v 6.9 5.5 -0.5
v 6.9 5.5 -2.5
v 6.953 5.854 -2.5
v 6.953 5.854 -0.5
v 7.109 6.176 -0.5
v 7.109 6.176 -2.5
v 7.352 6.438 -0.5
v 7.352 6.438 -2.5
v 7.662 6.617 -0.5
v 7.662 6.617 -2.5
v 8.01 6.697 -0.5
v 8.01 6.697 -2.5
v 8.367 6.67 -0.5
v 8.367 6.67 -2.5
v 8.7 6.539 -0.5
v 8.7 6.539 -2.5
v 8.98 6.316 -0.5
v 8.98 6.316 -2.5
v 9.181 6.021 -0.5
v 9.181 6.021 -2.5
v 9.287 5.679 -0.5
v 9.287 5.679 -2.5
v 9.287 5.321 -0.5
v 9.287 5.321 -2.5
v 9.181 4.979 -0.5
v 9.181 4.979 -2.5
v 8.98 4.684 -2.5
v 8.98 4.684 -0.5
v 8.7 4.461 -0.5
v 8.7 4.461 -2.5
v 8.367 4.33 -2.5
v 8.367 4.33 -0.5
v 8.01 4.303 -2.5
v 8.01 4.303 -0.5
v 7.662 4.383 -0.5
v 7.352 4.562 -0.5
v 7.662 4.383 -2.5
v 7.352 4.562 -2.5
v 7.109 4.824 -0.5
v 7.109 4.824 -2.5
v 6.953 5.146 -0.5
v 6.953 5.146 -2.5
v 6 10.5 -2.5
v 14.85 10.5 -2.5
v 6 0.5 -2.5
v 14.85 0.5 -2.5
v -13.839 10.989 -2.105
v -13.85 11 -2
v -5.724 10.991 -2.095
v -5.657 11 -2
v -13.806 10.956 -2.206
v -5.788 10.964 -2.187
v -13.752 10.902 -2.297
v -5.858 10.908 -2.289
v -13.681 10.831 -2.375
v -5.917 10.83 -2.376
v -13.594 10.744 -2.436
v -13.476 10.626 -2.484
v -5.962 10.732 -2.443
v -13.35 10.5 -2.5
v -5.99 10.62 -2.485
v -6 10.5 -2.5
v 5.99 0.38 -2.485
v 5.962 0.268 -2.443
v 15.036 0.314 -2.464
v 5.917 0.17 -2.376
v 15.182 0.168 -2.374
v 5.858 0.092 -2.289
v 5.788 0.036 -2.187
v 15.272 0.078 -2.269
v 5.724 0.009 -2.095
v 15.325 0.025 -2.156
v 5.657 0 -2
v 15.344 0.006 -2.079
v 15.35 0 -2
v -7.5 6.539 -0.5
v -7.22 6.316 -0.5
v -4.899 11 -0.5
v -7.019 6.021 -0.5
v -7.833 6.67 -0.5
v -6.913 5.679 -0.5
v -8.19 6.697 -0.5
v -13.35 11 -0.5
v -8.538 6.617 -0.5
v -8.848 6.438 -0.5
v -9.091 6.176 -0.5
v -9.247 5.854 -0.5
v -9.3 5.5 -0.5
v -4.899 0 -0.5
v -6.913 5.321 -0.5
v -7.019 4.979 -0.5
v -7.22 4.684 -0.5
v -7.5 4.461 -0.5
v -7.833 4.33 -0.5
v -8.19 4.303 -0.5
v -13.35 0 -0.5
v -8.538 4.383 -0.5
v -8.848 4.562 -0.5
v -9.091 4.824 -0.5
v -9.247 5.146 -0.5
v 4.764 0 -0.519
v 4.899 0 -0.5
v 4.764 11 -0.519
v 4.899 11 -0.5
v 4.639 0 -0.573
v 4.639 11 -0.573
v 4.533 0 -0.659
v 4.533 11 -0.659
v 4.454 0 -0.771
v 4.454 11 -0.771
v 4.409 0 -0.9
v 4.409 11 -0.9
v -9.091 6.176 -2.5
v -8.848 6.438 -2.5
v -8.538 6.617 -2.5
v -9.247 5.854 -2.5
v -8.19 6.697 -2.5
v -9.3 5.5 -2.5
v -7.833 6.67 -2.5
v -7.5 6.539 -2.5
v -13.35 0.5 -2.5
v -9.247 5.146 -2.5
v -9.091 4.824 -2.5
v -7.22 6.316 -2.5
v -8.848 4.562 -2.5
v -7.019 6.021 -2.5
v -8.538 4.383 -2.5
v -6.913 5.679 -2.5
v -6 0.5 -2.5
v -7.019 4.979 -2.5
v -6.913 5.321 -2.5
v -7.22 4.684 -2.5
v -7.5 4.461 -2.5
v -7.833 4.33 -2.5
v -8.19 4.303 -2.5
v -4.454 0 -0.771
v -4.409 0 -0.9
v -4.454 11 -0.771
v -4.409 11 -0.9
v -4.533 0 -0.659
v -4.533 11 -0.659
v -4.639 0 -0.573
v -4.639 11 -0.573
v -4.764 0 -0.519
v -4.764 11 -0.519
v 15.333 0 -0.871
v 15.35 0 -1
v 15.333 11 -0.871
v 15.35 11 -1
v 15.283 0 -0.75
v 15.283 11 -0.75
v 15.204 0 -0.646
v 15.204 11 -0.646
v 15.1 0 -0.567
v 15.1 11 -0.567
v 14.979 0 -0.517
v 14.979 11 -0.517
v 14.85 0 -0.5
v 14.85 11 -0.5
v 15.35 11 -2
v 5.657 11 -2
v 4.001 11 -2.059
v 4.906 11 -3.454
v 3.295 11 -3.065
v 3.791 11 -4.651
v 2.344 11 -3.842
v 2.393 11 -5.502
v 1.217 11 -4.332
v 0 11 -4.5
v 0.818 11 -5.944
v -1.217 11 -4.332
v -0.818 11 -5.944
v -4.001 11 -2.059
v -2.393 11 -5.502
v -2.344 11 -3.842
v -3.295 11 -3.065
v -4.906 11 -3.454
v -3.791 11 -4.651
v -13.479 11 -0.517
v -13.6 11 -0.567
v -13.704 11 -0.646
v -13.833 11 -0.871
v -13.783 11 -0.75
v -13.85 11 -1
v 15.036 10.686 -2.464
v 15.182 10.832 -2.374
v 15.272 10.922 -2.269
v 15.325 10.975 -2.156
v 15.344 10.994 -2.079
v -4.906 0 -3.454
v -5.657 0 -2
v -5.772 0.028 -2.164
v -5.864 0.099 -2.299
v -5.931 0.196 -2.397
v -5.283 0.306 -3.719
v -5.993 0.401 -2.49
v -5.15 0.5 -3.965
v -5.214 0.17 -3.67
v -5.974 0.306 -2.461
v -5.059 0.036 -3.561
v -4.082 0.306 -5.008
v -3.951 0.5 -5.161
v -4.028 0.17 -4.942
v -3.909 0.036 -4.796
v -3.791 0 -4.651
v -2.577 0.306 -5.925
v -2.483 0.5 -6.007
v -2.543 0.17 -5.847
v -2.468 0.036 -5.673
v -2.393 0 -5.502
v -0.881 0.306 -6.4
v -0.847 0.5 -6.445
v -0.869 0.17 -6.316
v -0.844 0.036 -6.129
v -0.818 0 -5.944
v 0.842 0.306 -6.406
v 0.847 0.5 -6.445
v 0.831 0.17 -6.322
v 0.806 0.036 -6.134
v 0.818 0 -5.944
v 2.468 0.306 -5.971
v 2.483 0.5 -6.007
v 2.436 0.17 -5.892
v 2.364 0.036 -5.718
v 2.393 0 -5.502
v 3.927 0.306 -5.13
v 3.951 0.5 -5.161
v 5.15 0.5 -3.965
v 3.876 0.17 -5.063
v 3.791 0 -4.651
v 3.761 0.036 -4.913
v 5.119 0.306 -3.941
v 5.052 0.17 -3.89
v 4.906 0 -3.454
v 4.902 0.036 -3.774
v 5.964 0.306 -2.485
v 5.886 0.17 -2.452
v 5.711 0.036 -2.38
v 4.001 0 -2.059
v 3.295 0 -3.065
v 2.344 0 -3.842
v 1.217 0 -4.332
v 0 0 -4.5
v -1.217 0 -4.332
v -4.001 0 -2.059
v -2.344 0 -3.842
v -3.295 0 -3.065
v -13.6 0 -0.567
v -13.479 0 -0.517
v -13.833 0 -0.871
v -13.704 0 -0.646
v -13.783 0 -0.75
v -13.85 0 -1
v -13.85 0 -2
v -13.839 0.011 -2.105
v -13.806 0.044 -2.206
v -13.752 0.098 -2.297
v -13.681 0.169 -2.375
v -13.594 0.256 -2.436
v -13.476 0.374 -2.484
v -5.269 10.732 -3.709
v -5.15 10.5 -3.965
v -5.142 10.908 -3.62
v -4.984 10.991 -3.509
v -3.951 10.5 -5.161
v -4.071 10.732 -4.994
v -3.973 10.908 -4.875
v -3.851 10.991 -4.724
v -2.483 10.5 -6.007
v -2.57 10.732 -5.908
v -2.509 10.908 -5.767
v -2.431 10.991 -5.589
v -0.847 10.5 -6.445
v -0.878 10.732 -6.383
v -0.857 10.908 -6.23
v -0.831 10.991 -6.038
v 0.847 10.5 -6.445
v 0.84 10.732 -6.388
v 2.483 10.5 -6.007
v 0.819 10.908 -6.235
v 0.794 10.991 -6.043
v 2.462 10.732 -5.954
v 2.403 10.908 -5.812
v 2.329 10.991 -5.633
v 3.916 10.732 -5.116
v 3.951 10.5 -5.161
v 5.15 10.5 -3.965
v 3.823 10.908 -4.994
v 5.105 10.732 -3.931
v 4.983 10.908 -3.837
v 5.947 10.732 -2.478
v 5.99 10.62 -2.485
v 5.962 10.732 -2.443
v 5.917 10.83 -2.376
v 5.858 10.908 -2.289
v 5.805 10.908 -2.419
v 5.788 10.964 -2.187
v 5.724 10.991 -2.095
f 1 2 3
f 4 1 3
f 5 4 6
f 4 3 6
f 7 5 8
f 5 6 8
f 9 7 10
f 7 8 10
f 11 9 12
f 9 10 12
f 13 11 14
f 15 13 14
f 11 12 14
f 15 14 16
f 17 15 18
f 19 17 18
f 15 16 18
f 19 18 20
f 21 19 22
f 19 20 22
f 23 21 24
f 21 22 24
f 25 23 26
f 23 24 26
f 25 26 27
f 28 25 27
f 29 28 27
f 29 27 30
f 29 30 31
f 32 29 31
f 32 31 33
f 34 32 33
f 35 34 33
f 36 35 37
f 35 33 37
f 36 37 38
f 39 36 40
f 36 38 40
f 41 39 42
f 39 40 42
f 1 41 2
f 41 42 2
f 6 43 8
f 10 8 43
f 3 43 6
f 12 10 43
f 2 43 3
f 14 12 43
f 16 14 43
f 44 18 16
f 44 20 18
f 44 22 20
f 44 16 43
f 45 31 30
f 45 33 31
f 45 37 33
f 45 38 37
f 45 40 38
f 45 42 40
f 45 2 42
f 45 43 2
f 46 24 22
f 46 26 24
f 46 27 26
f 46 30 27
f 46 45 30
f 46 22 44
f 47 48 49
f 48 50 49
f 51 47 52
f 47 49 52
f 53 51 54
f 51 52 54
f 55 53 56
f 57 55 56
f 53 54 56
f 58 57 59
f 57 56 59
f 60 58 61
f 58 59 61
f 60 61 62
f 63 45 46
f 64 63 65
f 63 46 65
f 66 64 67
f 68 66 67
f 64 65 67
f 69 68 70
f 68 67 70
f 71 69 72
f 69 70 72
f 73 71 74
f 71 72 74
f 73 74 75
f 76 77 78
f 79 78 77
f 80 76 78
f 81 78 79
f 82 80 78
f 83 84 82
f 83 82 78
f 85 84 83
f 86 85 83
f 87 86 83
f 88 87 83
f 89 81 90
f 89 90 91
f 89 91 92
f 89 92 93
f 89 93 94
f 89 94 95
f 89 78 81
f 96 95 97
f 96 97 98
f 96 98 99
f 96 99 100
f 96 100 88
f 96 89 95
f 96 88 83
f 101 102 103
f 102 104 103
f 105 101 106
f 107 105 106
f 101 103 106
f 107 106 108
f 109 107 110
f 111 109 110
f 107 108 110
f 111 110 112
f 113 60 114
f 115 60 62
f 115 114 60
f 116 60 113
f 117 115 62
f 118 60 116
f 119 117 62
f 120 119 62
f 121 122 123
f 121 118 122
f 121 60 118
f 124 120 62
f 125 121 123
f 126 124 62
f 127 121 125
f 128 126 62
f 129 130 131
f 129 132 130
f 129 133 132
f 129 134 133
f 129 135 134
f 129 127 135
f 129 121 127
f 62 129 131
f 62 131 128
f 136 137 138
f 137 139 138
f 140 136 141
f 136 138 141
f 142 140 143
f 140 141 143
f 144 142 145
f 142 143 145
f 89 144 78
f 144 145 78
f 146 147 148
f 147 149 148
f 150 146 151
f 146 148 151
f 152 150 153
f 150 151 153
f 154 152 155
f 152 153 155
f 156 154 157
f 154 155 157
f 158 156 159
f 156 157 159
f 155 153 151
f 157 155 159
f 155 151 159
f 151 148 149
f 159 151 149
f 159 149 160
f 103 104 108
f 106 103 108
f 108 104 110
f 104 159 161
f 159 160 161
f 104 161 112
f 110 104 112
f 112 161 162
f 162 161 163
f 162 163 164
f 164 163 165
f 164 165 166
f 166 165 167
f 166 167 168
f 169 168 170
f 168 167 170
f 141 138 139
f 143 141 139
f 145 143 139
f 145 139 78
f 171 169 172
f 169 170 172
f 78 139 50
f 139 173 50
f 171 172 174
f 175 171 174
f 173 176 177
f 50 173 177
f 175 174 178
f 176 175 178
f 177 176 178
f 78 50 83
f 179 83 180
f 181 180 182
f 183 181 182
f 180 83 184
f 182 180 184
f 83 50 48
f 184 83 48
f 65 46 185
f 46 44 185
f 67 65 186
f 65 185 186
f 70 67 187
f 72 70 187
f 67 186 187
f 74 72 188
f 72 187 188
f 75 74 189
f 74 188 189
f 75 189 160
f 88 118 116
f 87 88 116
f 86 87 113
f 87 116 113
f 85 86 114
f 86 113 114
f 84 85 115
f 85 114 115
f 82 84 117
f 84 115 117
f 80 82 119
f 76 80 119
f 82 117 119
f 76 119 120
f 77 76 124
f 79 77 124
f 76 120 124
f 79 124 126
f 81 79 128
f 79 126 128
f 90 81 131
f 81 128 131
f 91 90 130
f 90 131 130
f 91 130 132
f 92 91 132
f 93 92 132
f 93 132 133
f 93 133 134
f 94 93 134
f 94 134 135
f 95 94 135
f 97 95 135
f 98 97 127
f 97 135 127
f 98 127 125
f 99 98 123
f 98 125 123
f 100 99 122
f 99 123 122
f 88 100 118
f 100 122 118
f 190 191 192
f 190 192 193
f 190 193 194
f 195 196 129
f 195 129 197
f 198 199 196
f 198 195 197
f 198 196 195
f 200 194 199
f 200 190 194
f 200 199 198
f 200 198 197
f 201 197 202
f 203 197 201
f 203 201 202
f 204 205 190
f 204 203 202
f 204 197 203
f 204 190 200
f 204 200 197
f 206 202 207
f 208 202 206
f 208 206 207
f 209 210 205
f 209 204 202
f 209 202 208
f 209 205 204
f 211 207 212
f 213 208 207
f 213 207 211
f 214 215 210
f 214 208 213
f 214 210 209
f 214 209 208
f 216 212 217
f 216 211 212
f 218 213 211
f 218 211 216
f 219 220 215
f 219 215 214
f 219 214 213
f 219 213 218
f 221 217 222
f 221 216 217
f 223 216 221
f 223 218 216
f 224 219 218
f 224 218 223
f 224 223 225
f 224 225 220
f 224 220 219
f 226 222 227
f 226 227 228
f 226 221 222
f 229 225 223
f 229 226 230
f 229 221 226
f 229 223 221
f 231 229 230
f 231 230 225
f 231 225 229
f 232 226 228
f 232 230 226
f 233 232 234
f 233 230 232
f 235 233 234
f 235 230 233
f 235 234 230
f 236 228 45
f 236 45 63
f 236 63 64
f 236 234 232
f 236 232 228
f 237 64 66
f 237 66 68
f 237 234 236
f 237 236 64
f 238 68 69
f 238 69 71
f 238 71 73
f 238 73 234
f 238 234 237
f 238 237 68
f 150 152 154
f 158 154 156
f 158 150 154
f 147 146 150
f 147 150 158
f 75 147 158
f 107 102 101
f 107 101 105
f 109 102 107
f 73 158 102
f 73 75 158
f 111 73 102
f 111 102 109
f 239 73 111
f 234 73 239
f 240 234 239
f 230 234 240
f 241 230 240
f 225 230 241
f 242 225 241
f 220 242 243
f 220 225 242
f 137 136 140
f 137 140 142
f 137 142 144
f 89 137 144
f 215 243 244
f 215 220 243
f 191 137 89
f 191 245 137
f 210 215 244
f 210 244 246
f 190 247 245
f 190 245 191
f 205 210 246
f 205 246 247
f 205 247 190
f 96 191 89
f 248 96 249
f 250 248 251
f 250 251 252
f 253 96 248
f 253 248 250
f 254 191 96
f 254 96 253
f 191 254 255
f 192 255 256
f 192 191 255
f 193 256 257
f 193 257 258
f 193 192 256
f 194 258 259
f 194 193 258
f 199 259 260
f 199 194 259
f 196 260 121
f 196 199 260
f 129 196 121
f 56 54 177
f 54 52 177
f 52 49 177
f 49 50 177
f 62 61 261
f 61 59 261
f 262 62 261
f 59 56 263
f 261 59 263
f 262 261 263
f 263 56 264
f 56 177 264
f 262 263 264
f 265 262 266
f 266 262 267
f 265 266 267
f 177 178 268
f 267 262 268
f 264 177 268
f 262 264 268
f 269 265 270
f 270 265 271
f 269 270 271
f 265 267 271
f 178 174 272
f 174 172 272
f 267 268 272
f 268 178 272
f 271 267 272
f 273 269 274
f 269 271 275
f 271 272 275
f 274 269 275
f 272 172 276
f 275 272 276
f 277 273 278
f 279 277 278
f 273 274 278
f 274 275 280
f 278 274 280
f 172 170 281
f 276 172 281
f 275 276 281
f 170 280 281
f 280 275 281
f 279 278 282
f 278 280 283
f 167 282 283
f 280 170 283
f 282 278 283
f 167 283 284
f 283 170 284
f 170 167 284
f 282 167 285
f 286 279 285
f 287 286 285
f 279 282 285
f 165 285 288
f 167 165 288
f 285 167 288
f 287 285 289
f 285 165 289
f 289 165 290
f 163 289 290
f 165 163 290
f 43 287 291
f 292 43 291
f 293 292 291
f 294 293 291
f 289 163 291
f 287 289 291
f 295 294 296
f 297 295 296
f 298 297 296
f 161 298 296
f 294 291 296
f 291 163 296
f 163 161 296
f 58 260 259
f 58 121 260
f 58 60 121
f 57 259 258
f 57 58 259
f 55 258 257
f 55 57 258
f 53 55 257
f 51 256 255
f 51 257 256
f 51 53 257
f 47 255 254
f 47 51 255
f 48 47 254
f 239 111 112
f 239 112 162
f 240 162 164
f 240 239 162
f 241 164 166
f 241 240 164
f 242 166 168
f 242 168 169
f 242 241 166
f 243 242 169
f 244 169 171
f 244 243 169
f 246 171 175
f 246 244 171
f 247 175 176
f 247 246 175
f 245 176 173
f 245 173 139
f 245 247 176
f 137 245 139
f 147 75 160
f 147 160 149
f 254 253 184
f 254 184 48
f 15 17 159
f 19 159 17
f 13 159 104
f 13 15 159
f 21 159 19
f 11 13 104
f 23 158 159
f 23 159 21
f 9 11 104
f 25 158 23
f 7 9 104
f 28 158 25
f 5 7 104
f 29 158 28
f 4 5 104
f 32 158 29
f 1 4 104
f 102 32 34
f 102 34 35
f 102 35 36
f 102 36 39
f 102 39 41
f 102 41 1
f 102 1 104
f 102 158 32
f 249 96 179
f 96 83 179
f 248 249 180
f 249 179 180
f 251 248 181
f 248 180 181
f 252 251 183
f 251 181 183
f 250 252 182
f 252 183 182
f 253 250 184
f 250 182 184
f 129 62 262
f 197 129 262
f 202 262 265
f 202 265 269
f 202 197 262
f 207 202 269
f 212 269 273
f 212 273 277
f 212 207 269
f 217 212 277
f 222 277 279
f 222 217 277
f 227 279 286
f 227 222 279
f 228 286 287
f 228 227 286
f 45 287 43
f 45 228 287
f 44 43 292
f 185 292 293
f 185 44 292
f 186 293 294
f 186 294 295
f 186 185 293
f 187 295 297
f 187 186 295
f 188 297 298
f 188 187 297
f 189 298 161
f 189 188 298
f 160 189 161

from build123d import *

# Parameters (mm, degrees)
BOSS_EXTRUDE1_DEPTH = 11
SKETCH2_R           = 1.2
CUT_EXTRUDE1_DEPTH  = 2
FILLET1_R           = 0.5


with BuildPart() as part:
    # Sketch1 → Boss-Extrude1 (new body)
    with BuildSketch(Plane(origin=(0, 0, 0), x_dir=(1, 0, 0), z_dir=(0, 1, 0))):
        with BuildLine():
            Line((6, 2.5), (15.35, 2.5))
            Line((15.35, 2.5), (15.35, 0.5))
            Line((15.35, 0.5), (6.480740698, 0.5))
            Line((6.480740698, 0.5), (4.472135955, 0.5))
            ThreePointArc((4.472135955, 0.5), (0, 4.5), (-4.472135955, 0.5))
            Line((-4.472135955, 0.5), (-6.480740698, 0.5))
            Line((-6.480740698, 0.5), (-13.85, 0.5))
            Line((-13.85, 0.5), (-13.85, 2.5))
            Line((-13.85, 2.5), (-6, 2.5))
            ThreePointArc((-6, 2.5), (0, 6.5), (6, 2.5))
        make_face()
    extrude(amount=BOSS_EXTRUDE1_DEPTH)

    # Sketch2 → Cut-Extrude1 (cut)
    with BuildSketch(Plane(origin=(0, 0, -2.5), x_dir=(-1, 0, 0), z_dir=(0, 0, -1))):
        with Locations((-8.1, 5.5)):
            Circle(SKETCH2_R)
        with Locations((8.1, 5.5)):
            Circle(SKETCH2_R)
    extrude(amount=-CUT_EXTRUDE1_DEPTH, mode=Mode.SUBTRACT)

    # Fillet1
    fillet1_edges = [part.edges().sort_by_distance(p)[0] for p in [
        (0, 11, -6.5),
        (-9.925, 0, -2.5),
        (0, 0, -6.5),
        (10.675, 0, -2.5),
        (-9.925, 11, -2.5),
        (15.35, 5.5, -2.5),
        (15.35, 5.5, -0.5),
        (4.472135955, 5.5, -0.5),
        (-4.472135955, 5.5, -0.5),
        (-13.85, 5.5, -0.5),
        (-13.85, 5.5, -2.5),
        (10.675, 11, -2.5),
    ]]
    fillet(fillet1_edges, radius=FILLET1_R)


solid = part.part
